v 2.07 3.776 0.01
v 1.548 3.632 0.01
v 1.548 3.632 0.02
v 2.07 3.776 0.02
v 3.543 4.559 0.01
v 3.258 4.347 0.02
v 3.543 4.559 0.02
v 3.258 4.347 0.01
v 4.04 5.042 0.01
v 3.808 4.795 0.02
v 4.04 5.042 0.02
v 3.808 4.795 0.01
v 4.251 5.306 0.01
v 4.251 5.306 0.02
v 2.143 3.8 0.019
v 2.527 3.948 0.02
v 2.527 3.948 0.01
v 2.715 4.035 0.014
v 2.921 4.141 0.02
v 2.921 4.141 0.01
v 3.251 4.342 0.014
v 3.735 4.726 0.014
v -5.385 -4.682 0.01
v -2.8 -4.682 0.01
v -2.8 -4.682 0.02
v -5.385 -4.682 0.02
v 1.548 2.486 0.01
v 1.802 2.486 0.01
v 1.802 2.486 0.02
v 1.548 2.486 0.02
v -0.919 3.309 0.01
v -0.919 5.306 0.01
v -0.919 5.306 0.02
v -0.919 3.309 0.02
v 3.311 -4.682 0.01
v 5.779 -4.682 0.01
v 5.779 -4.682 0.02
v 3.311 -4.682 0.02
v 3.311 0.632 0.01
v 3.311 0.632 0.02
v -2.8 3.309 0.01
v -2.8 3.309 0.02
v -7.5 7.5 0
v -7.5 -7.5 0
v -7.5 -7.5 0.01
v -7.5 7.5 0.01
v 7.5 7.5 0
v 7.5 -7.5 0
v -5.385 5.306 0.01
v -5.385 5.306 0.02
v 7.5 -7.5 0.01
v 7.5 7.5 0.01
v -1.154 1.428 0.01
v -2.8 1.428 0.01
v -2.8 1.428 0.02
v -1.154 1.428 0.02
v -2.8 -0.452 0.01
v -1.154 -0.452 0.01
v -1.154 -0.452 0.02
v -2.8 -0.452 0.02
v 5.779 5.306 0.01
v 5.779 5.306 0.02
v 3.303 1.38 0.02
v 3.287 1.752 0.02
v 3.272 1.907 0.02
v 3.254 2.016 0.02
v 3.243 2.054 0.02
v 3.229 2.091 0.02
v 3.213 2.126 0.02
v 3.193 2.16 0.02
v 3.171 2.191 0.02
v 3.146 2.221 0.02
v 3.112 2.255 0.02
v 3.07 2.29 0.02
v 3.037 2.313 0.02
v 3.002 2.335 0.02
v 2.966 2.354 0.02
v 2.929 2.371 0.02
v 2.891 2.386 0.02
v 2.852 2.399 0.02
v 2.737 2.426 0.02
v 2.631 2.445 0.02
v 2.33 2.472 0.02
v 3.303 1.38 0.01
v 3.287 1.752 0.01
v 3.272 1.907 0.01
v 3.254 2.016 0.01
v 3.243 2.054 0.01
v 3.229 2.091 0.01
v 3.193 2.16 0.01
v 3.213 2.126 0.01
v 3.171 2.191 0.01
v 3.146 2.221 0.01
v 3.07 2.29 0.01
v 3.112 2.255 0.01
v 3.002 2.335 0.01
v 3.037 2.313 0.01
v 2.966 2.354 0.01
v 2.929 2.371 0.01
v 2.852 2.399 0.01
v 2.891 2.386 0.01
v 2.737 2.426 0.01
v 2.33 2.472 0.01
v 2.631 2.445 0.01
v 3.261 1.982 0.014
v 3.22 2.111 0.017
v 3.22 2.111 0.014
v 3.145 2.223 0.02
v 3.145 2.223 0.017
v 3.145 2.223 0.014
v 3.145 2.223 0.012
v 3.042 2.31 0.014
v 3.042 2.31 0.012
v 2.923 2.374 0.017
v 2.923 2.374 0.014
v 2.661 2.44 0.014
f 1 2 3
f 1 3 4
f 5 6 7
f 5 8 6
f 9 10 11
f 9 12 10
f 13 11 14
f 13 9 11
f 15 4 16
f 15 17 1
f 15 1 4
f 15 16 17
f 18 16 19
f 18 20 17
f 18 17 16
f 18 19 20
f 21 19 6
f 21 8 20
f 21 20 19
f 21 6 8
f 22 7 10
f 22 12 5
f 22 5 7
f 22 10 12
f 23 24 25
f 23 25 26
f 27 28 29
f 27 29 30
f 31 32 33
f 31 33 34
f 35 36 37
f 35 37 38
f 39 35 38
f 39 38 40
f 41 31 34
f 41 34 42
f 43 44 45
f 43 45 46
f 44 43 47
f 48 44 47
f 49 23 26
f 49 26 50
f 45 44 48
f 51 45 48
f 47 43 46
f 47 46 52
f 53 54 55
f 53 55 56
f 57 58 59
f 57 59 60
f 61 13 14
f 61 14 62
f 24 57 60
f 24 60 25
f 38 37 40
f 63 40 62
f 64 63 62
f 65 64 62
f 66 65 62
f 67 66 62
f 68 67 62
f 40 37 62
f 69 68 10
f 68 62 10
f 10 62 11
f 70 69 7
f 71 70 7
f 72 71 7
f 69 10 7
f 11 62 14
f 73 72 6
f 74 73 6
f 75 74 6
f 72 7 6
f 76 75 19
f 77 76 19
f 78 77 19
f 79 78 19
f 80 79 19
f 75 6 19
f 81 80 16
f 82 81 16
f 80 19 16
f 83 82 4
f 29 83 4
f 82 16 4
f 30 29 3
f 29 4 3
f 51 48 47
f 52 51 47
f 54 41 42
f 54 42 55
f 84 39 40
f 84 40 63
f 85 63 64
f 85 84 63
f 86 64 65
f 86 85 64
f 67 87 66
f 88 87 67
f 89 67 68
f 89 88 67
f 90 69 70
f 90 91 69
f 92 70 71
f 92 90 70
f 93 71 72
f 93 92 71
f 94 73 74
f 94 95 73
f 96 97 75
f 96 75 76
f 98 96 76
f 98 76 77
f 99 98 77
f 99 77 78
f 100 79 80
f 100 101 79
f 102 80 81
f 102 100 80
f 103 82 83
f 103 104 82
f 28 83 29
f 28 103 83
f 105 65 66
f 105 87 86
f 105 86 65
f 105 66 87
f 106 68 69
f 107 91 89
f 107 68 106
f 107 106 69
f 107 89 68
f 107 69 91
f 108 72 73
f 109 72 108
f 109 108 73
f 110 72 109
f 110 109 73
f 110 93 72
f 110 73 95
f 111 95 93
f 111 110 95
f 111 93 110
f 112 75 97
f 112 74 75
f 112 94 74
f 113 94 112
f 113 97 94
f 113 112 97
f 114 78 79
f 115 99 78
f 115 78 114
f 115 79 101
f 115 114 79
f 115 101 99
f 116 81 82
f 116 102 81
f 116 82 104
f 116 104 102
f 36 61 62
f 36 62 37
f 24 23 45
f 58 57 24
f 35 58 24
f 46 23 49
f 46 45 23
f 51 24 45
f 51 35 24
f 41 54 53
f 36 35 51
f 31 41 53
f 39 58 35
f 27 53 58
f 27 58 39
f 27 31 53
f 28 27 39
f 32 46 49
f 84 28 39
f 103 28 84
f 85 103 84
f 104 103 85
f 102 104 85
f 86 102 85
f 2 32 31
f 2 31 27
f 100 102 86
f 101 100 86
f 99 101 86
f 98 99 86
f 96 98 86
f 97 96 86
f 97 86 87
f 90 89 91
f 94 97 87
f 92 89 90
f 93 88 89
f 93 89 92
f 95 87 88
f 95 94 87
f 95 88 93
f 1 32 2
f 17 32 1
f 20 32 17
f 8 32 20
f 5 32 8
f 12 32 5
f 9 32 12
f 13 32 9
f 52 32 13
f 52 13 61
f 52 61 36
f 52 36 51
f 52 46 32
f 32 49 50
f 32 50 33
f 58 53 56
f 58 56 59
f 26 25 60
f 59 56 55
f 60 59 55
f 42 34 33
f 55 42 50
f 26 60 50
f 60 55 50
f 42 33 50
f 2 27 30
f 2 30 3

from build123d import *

# Parameters (mm, degrees)
SKETCH1_W           = 15
SKETCH1_H           = 15
BASE_EXTRUDE_DEPTH  = 0.01
BOSS_EXTRUDE1_DEPTH = 0.01


with BuildPart() as part:
    # Sketch1 → Base-Extrude (new body)
    with BuildSketch(Plane.XY):
        Rectangle(SKETCH1_W, SKETCH1_H)
    extrude(amount=BASE_EXTRUDE_DEPTH)

    # Sketch3 → Boss-Extrude1 (add)
    with BuildSketch(Plane.XY.offset(0.01)):
        Polygon((-5.384794802, 5.306205085), (-0.919413872, 5.306205085), (-0.919413872, 3.308534669), (-2.799574264, 3.308534669), (-2.799574264, 1.428374278), (-1.154433921, 1.428374278), (-1.154433921, -0.451786113), (-2.799574264, -0.451786113), (-2.799574264, -4.682146994), (-5.384794802, -4.682146994), align=None)
        with BuildLine():
            Line((5.778657522, 5.306205085), (5.778657522, -4.682146994))
            Line((5.778657522, -4.682146994), (3.310947008, -4.682146994))
            Line((3.310947008, -4.682146994), (3.310947008, 0.631509425))
            add(Edge.make_bspline(
                [(3.310947008, 0.631509425), (3.311365342, 0.722705919), (3.312157129, 0.895315198), (3.306902941, 1.140099359), (3.305115083, 1.356227307), (3.29663727, 1.543462875), (3.289754242, 1.702011057), (3.28210286, 1.832060335), (3.268629119, 1.932937084), (3.253452809, 2.029125513), (3.218364299, 2.126245543), (3.149902887, 2.224742427), (3.055027036, 2.30592508), (2.957850387, 2.361661392), (2.86133248, 2.397721466), (2.767354753, 2.419754241), (2.654999623, 2.442924218), (2.522270481, 2.457900628), (2.369827486, 2.470808129), (2.197743036, 2.479518793), (2.006133688, 2.485064416), (1.87206589, 2.485654626), (1.801677632, 2.485964498)],
                knots=[0, 0, 0, 0, 0.000273578, 0.000517806, 0.000734496, 0.000921922, 0.001079997, 0.001210682, 0.001312482, 0.001385234, 0.001502572, 0.001618697, 0.001740987, 0.001874214, 0.001952652, 0.002049287, 0.002163436, 0.002296663, 0.0024496, 0.002622437, 0.00281347, 0.003024629, 0.003024629, 0.003024629, 0.003024629], degree=3))
            Line((1.801677632, 2.485964498), (1.548296642, 2.485964498))
            Line((1.548296642, 2.485964498), (1.548296642, 3.631687237))
            add(Edge.make_bspline(
                [(1.548296642, 3.631687237), (1.692768945, 3.668008672), (1.97564938, 3.739126964), (2.381568254, 3.881832395), (2.761461914, 4.050628674), (3.11452453, 4.24679379), (3.440527614, 4.470451829), (3.738971557, 4.721598196), (4.0130797, 4.998312096), (4.171649736, 5.203494338), (4.251027204, 5.306205085)],
                knots=[0, 0, 0, 0, 0.000446718, 0.000874686, 0.001288928, 0.001692505, 0.002084661, 0.002473028, 0.002861244, 0.003250366, 0.003250366, 0.003250366, 0.003250366], degree=3))
            Line((4.251027204, 5.306205085), (5.778657522, 5.306205085))
        make_face()
    extrude(amount=BOSS_EXTRUDE1_DEPTH)


solid = part.part
